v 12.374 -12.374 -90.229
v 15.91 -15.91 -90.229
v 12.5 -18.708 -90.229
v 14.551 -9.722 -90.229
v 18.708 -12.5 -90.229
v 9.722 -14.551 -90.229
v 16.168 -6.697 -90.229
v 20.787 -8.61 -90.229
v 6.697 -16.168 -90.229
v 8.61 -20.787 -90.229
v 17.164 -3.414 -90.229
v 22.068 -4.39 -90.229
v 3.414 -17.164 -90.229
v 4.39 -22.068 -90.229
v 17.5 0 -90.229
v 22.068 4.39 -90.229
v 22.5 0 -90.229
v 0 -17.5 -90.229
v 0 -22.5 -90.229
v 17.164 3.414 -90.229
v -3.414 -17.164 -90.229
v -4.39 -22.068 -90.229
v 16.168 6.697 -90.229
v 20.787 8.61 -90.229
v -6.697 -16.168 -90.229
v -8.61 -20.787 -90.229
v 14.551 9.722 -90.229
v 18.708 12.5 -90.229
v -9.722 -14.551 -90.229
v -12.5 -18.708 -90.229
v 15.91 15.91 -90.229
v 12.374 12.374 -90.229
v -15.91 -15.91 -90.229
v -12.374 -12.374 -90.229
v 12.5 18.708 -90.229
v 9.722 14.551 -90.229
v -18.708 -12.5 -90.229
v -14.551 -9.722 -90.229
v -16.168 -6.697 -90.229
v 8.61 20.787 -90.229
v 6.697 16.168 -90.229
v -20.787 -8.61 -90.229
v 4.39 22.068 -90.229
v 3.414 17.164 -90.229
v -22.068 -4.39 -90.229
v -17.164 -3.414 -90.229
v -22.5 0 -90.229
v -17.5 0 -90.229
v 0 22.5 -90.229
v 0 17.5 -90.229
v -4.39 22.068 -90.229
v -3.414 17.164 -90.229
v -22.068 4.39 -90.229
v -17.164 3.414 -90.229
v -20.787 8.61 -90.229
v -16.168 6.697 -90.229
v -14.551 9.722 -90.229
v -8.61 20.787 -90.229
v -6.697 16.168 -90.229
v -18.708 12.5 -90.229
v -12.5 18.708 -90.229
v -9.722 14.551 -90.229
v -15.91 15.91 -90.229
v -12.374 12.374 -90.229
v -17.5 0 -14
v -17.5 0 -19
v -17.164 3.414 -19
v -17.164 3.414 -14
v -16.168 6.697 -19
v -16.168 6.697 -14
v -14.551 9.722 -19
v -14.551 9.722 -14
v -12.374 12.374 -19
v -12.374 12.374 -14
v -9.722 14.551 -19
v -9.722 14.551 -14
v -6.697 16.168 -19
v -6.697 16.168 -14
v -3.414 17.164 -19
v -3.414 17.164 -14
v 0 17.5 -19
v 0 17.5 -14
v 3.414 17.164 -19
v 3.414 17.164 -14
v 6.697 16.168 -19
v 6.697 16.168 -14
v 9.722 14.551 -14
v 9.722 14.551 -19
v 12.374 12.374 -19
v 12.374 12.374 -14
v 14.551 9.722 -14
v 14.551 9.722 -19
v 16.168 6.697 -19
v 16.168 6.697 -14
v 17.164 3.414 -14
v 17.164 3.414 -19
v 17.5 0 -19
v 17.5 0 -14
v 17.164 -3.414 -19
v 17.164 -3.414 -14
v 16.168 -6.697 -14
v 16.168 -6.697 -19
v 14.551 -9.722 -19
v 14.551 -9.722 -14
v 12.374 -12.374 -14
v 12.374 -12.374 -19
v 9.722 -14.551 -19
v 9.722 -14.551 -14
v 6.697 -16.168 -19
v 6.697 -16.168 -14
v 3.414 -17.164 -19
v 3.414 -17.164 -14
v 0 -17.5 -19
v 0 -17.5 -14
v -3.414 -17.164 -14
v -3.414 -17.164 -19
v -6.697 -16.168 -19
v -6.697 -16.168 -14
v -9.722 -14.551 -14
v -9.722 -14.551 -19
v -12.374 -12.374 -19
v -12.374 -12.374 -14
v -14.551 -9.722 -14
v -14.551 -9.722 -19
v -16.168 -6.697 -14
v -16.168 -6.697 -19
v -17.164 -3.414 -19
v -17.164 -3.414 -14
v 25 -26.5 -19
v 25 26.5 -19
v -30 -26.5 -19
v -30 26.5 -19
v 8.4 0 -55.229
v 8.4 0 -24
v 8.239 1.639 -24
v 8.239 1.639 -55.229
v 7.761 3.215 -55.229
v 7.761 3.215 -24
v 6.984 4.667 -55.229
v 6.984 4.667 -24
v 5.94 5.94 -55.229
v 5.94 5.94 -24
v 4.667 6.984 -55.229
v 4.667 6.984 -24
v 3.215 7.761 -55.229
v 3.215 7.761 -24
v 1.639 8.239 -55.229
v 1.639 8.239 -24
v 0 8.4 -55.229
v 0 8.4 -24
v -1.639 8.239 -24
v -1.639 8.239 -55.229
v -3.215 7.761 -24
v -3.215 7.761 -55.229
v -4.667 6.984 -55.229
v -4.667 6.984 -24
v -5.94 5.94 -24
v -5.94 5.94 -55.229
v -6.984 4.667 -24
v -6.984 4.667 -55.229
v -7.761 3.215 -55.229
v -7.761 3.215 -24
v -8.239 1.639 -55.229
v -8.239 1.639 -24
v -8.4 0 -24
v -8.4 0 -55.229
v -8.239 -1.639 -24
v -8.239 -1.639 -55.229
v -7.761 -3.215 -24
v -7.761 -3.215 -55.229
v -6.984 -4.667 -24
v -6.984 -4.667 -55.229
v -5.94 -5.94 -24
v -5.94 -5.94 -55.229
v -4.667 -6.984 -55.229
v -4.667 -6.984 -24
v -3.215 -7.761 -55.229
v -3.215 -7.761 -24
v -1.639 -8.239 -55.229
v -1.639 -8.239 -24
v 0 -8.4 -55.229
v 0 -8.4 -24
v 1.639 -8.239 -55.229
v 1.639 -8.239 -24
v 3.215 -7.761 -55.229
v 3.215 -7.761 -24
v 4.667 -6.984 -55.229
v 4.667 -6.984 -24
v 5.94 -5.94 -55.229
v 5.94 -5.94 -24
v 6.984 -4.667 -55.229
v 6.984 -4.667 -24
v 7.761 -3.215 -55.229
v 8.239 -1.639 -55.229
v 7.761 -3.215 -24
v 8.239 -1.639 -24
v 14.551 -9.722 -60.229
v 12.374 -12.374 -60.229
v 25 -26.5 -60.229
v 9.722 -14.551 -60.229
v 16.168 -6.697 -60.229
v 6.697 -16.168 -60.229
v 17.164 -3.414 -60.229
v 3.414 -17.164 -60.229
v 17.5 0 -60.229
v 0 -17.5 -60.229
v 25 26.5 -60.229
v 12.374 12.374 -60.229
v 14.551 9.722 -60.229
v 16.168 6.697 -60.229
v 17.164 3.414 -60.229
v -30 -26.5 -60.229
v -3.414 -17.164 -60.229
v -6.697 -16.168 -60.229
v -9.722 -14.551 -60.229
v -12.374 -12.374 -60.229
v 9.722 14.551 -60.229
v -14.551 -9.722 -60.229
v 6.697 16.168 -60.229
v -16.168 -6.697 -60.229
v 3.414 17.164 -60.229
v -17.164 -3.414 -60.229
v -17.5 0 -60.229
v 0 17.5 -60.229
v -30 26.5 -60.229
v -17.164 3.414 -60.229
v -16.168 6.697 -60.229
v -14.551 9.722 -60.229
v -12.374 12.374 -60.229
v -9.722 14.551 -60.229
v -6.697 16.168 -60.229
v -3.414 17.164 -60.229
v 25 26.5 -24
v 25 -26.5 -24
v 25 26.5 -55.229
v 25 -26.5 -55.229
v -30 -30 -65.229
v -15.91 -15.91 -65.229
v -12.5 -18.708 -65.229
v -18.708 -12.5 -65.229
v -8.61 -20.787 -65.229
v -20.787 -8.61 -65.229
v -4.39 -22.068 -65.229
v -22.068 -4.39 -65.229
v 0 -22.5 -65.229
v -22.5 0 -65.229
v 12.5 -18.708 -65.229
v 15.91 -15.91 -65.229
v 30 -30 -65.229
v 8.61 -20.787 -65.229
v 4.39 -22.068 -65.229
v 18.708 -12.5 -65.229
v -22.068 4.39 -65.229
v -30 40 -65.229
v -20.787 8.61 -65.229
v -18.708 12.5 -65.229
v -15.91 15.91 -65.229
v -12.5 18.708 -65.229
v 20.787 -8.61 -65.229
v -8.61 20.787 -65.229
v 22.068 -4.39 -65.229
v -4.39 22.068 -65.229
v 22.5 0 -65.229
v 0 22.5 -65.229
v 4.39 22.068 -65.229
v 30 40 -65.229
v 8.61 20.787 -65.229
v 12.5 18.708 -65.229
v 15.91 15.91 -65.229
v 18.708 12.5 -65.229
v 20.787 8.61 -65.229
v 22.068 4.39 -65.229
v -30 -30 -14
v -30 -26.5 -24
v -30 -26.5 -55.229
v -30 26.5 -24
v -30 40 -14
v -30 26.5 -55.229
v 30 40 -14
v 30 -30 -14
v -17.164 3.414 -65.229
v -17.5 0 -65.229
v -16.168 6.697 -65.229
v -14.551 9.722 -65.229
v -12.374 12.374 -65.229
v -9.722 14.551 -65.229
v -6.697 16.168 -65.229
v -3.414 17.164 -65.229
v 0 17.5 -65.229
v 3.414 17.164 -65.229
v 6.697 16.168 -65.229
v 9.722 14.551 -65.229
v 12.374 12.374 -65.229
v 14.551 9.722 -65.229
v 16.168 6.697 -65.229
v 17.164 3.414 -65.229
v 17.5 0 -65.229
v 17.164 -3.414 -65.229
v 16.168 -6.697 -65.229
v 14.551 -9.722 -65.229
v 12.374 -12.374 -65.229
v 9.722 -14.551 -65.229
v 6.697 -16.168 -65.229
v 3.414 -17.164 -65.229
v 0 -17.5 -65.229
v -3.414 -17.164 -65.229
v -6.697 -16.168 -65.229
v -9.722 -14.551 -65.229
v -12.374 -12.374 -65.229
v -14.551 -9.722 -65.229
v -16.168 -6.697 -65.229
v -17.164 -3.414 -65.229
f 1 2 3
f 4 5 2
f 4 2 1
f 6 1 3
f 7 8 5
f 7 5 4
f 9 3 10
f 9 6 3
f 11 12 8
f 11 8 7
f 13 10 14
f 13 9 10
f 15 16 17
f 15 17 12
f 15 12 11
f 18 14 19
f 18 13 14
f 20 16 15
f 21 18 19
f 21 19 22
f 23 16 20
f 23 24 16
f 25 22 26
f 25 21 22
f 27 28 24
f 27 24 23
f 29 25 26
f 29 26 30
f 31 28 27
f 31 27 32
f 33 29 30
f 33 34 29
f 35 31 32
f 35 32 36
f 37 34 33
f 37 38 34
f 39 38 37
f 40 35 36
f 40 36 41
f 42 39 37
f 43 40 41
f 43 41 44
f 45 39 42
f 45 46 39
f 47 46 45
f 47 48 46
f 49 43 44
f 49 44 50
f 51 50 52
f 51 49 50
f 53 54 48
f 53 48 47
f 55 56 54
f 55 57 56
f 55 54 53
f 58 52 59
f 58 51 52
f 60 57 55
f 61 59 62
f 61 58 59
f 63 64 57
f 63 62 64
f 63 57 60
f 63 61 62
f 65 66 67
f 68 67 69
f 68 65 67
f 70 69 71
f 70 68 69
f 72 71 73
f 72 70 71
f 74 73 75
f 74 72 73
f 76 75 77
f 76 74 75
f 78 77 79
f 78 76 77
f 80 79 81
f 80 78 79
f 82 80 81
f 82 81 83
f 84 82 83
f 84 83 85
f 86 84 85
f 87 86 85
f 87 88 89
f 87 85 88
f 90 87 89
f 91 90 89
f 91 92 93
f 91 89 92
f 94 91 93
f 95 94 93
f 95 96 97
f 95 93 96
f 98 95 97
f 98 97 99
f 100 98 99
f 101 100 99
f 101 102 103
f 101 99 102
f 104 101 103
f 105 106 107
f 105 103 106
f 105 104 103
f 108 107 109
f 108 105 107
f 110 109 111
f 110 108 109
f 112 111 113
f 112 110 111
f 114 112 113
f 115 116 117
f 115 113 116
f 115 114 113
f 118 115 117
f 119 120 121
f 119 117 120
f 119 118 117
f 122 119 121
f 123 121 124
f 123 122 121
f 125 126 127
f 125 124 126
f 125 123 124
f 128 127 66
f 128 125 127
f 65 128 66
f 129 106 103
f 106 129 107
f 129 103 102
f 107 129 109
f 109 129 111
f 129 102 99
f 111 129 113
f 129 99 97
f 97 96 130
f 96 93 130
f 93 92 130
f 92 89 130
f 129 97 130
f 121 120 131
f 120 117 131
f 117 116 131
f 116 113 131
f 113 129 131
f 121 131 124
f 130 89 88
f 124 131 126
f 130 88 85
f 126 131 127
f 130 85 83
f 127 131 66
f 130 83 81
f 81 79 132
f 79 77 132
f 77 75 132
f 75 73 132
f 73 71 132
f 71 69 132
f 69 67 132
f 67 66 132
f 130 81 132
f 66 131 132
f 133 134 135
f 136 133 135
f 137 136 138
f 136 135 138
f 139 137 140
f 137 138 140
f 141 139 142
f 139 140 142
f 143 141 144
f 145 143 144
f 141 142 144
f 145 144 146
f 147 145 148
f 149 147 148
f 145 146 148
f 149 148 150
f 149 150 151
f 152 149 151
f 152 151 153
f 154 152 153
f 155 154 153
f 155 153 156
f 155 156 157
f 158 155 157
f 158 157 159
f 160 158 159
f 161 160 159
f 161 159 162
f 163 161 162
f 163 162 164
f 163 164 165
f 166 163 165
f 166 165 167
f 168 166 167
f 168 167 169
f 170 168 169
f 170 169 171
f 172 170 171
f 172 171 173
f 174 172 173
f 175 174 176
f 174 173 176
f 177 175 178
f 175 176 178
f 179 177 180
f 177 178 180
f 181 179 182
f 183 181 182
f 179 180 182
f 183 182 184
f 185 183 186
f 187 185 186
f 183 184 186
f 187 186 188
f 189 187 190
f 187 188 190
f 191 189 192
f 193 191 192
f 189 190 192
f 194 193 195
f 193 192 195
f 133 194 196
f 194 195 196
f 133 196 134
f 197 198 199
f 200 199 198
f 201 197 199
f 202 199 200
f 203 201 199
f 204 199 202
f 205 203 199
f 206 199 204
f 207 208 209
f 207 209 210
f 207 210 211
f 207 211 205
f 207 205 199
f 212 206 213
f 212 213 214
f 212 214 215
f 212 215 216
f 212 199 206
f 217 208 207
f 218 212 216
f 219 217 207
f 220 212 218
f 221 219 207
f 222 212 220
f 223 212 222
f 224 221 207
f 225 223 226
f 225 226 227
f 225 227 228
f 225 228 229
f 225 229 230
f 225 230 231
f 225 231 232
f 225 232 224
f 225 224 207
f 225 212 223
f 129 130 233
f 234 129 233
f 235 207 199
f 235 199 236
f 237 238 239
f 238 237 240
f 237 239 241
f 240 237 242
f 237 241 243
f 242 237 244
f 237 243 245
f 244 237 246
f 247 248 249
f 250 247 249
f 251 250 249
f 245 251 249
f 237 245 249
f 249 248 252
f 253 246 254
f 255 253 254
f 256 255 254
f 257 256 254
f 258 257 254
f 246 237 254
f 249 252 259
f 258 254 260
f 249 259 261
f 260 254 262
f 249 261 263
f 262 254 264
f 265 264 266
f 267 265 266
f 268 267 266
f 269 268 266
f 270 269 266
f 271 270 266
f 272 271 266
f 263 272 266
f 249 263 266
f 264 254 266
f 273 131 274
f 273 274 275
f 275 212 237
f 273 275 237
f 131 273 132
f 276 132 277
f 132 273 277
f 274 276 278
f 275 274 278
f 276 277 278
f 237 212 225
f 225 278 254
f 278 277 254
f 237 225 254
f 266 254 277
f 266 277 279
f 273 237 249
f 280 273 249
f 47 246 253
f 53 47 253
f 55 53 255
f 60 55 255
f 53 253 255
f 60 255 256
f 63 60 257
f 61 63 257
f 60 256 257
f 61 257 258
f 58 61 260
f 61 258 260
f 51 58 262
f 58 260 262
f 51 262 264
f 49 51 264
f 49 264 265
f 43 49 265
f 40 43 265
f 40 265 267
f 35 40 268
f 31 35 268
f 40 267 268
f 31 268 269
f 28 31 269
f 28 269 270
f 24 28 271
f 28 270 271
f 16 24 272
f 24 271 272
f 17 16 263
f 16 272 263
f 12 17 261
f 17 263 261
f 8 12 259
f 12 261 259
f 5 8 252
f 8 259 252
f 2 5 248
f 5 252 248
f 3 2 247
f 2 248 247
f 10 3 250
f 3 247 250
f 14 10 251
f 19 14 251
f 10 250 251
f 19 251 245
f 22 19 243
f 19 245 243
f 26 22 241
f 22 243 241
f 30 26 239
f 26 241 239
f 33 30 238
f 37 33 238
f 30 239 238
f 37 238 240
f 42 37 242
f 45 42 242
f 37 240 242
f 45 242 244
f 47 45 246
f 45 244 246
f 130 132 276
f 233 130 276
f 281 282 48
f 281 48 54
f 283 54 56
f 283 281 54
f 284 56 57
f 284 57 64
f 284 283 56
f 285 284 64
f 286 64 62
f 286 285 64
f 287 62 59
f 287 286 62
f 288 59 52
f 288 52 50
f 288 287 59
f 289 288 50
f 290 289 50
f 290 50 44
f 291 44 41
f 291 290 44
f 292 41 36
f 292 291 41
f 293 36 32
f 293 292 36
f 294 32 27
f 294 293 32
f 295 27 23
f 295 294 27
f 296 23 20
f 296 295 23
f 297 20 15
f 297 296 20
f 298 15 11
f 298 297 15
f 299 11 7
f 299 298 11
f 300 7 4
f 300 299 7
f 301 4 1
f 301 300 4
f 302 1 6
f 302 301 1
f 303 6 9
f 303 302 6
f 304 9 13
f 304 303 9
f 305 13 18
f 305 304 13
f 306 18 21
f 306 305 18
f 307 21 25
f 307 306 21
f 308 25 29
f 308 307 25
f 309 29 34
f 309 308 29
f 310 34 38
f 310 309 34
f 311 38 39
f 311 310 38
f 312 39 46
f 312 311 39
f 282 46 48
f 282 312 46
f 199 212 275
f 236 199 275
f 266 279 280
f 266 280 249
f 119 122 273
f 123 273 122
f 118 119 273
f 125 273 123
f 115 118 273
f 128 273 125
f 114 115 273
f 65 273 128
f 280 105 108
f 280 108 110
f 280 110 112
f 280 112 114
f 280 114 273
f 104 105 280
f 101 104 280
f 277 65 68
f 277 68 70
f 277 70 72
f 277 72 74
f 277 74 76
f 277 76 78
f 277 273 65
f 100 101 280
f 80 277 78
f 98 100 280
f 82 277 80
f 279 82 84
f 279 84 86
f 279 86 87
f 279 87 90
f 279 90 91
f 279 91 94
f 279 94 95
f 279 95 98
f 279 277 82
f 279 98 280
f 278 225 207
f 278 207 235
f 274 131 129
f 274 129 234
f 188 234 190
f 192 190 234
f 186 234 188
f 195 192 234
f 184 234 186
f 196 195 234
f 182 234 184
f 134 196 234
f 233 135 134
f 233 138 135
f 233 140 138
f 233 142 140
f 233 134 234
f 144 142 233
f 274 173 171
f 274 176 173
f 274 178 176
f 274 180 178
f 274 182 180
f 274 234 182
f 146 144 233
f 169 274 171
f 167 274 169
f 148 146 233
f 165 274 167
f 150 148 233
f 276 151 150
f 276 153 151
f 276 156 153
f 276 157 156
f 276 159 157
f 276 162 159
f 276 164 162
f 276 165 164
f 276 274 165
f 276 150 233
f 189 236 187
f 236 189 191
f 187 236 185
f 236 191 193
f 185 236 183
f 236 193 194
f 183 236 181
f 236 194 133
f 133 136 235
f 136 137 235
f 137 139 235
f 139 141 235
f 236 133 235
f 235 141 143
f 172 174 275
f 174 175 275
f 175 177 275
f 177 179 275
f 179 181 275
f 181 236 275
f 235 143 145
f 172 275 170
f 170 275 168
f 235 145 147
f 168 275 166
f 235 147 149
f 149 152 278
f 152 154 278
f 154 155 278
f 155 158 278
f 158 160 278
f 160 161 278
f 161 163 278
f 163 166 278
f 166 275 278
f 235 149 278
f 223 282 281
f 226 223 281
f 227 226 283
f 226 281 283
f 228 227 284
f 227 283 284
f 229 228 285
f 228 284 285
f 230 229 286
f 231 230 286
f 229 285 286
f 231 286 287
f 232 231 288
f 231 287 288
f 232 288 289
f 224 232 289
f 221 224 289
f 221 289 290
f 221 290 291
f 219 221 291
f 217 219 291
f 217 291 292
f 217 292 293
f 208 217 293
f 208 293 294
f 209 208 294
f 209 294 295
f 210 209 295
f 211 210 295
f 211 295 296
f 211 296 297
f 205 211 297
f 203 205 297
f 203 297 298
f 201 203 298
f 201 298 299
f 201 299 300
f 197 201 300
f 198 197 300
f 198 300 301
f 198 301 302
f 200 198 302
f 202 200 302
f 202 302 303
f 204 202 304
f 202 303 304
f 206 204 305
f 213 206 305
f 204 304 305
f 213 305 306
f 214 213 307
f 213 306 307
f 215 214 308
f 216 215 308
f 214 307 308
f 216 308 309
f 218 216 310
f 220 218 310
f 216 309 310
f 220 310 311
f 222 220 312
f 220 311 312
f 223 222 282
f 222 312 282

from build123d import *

# Parameters (mm, degrees)
SZKIC2_W                         = 60
SZKIC2_H                         = 51.228721397
DODANIE_WYCI_GNI_CIE1_DEPTH      = 40
DODANIE_WYCI_GNI_CIE1_DEPTH_BACK = 30
SZKIC3_R                         = 8.4
WYTNIJ_WYCI_GNI_CIE1_DEPTH       = 52.228721397
SZKIC5_R                         = 17.5
WYTNIJ_WYCI_GNI_CIE2_DEPTH       = 10
SZKIC6_W                         = 5
SZKIC6_H                         = 53
WYTNIJ_WYCI_GNI_CIE3_DEPTH       = 55
SZKIC8_R                         = 22.5
SZKIC8_R_2                       = 17.5
DODANIE_WYCI_GNI_CIE3_DEPTH      = 25


with BuildPart() as part:
    # Szkic2 → Dodanie-wyciągnięcie1 (new body, two sides)
    with BuildSketch(Plane(origin=(0, 0, 0), x_dir=(1, 0, 0), z_dir=(0, 1, 0))) as dodanie_wyci_gni_cie1_sk:
        with Locations((0, 39.614360699)):
            Rectangle(SZKIC2_W, SZKIC2_H)
    extrude(amount=DODANIE_WYCI_GNI_CIE1_DEPTH)
    extrude(dodanie_wyci_gni_cie1_sk.sketch, amount=-DODANIE_WYCI_GNI_CIE1_DEPTH_BACK)

    # Szkic3 → Wytnij-wyciągnięcie1 (cut, through all)
    with BuildSketch(Plane.XY.offset(-14)):
        Circle(SZKIC3_R)
    extrude(amount=-WYTNIJ_WYCI_GNI_CIE1_DEPTH, mode=Mode.SUBTRACT)

    # Szkic5 → Wytnij-wyciągnięcie2 (cut)
    with BuildSketch(Plane(origin=(0, 0, -65.228721397), x_dir=(-1, 0, 0), z_dir=(0, 0, -1))):
        Circle(SZKIC5_R)
    wytnij_wyci_gni_cie2 = extrude(amount=-WYTNIJ_WYCI_GNI_CIE2_DEPTH, mode=Mode.SUBTRACT)

    # Szkic6 → Wytnij-wyciągnięcie3 (cut)
    with BuildSketch(Plane.ZY.offset(30)):
        with Locations((-57.728721397, 0)):
            Rectangle(SZKIC6_W, SZKIC6_H)
    wytnij_wyci_gni_cie3 = extrude(amount=-WYTNIJ_WYCI_GNI_CIE3_DEPTH, mode=Mode.SUBTRACT)

    # Lustro1: Wytnij-wyciągnięcie2, Wytnij-wyciągnięcie3 across plane
    add(wytnij_wyci_gni_cie2.mirror(Plane(origin=(0, 0, -39.614360698), x_dir=(1, 0, 0), z_dir=(0, 0, -1))), mode=Mode.SUBTRACT)
    add(wytnij_wyci_gni_cie3.mirror(Plane(origin=(0, 0, -39.614360698), x_dir=(1, 0, 0), z_dir=(0, 0, -1))), mode=Mode.SUBTRACT)

    # Szkic8 → Dodanie-wyciągnięcie3 (add)
    with BuildSketch(Plane(origin=(0, 0, -65.228721397), x_dir=(-1, 0, 0), z_dir=(0, 0, -1))):
        Circle(SZKIC8_R)
        Circle(SZKIC8_R_2, mode=Mode.SUBTRACT)
    extrude(amount=DODANIE_WYCI_GNI_CIE3_DEPTH)


solid = part.part
